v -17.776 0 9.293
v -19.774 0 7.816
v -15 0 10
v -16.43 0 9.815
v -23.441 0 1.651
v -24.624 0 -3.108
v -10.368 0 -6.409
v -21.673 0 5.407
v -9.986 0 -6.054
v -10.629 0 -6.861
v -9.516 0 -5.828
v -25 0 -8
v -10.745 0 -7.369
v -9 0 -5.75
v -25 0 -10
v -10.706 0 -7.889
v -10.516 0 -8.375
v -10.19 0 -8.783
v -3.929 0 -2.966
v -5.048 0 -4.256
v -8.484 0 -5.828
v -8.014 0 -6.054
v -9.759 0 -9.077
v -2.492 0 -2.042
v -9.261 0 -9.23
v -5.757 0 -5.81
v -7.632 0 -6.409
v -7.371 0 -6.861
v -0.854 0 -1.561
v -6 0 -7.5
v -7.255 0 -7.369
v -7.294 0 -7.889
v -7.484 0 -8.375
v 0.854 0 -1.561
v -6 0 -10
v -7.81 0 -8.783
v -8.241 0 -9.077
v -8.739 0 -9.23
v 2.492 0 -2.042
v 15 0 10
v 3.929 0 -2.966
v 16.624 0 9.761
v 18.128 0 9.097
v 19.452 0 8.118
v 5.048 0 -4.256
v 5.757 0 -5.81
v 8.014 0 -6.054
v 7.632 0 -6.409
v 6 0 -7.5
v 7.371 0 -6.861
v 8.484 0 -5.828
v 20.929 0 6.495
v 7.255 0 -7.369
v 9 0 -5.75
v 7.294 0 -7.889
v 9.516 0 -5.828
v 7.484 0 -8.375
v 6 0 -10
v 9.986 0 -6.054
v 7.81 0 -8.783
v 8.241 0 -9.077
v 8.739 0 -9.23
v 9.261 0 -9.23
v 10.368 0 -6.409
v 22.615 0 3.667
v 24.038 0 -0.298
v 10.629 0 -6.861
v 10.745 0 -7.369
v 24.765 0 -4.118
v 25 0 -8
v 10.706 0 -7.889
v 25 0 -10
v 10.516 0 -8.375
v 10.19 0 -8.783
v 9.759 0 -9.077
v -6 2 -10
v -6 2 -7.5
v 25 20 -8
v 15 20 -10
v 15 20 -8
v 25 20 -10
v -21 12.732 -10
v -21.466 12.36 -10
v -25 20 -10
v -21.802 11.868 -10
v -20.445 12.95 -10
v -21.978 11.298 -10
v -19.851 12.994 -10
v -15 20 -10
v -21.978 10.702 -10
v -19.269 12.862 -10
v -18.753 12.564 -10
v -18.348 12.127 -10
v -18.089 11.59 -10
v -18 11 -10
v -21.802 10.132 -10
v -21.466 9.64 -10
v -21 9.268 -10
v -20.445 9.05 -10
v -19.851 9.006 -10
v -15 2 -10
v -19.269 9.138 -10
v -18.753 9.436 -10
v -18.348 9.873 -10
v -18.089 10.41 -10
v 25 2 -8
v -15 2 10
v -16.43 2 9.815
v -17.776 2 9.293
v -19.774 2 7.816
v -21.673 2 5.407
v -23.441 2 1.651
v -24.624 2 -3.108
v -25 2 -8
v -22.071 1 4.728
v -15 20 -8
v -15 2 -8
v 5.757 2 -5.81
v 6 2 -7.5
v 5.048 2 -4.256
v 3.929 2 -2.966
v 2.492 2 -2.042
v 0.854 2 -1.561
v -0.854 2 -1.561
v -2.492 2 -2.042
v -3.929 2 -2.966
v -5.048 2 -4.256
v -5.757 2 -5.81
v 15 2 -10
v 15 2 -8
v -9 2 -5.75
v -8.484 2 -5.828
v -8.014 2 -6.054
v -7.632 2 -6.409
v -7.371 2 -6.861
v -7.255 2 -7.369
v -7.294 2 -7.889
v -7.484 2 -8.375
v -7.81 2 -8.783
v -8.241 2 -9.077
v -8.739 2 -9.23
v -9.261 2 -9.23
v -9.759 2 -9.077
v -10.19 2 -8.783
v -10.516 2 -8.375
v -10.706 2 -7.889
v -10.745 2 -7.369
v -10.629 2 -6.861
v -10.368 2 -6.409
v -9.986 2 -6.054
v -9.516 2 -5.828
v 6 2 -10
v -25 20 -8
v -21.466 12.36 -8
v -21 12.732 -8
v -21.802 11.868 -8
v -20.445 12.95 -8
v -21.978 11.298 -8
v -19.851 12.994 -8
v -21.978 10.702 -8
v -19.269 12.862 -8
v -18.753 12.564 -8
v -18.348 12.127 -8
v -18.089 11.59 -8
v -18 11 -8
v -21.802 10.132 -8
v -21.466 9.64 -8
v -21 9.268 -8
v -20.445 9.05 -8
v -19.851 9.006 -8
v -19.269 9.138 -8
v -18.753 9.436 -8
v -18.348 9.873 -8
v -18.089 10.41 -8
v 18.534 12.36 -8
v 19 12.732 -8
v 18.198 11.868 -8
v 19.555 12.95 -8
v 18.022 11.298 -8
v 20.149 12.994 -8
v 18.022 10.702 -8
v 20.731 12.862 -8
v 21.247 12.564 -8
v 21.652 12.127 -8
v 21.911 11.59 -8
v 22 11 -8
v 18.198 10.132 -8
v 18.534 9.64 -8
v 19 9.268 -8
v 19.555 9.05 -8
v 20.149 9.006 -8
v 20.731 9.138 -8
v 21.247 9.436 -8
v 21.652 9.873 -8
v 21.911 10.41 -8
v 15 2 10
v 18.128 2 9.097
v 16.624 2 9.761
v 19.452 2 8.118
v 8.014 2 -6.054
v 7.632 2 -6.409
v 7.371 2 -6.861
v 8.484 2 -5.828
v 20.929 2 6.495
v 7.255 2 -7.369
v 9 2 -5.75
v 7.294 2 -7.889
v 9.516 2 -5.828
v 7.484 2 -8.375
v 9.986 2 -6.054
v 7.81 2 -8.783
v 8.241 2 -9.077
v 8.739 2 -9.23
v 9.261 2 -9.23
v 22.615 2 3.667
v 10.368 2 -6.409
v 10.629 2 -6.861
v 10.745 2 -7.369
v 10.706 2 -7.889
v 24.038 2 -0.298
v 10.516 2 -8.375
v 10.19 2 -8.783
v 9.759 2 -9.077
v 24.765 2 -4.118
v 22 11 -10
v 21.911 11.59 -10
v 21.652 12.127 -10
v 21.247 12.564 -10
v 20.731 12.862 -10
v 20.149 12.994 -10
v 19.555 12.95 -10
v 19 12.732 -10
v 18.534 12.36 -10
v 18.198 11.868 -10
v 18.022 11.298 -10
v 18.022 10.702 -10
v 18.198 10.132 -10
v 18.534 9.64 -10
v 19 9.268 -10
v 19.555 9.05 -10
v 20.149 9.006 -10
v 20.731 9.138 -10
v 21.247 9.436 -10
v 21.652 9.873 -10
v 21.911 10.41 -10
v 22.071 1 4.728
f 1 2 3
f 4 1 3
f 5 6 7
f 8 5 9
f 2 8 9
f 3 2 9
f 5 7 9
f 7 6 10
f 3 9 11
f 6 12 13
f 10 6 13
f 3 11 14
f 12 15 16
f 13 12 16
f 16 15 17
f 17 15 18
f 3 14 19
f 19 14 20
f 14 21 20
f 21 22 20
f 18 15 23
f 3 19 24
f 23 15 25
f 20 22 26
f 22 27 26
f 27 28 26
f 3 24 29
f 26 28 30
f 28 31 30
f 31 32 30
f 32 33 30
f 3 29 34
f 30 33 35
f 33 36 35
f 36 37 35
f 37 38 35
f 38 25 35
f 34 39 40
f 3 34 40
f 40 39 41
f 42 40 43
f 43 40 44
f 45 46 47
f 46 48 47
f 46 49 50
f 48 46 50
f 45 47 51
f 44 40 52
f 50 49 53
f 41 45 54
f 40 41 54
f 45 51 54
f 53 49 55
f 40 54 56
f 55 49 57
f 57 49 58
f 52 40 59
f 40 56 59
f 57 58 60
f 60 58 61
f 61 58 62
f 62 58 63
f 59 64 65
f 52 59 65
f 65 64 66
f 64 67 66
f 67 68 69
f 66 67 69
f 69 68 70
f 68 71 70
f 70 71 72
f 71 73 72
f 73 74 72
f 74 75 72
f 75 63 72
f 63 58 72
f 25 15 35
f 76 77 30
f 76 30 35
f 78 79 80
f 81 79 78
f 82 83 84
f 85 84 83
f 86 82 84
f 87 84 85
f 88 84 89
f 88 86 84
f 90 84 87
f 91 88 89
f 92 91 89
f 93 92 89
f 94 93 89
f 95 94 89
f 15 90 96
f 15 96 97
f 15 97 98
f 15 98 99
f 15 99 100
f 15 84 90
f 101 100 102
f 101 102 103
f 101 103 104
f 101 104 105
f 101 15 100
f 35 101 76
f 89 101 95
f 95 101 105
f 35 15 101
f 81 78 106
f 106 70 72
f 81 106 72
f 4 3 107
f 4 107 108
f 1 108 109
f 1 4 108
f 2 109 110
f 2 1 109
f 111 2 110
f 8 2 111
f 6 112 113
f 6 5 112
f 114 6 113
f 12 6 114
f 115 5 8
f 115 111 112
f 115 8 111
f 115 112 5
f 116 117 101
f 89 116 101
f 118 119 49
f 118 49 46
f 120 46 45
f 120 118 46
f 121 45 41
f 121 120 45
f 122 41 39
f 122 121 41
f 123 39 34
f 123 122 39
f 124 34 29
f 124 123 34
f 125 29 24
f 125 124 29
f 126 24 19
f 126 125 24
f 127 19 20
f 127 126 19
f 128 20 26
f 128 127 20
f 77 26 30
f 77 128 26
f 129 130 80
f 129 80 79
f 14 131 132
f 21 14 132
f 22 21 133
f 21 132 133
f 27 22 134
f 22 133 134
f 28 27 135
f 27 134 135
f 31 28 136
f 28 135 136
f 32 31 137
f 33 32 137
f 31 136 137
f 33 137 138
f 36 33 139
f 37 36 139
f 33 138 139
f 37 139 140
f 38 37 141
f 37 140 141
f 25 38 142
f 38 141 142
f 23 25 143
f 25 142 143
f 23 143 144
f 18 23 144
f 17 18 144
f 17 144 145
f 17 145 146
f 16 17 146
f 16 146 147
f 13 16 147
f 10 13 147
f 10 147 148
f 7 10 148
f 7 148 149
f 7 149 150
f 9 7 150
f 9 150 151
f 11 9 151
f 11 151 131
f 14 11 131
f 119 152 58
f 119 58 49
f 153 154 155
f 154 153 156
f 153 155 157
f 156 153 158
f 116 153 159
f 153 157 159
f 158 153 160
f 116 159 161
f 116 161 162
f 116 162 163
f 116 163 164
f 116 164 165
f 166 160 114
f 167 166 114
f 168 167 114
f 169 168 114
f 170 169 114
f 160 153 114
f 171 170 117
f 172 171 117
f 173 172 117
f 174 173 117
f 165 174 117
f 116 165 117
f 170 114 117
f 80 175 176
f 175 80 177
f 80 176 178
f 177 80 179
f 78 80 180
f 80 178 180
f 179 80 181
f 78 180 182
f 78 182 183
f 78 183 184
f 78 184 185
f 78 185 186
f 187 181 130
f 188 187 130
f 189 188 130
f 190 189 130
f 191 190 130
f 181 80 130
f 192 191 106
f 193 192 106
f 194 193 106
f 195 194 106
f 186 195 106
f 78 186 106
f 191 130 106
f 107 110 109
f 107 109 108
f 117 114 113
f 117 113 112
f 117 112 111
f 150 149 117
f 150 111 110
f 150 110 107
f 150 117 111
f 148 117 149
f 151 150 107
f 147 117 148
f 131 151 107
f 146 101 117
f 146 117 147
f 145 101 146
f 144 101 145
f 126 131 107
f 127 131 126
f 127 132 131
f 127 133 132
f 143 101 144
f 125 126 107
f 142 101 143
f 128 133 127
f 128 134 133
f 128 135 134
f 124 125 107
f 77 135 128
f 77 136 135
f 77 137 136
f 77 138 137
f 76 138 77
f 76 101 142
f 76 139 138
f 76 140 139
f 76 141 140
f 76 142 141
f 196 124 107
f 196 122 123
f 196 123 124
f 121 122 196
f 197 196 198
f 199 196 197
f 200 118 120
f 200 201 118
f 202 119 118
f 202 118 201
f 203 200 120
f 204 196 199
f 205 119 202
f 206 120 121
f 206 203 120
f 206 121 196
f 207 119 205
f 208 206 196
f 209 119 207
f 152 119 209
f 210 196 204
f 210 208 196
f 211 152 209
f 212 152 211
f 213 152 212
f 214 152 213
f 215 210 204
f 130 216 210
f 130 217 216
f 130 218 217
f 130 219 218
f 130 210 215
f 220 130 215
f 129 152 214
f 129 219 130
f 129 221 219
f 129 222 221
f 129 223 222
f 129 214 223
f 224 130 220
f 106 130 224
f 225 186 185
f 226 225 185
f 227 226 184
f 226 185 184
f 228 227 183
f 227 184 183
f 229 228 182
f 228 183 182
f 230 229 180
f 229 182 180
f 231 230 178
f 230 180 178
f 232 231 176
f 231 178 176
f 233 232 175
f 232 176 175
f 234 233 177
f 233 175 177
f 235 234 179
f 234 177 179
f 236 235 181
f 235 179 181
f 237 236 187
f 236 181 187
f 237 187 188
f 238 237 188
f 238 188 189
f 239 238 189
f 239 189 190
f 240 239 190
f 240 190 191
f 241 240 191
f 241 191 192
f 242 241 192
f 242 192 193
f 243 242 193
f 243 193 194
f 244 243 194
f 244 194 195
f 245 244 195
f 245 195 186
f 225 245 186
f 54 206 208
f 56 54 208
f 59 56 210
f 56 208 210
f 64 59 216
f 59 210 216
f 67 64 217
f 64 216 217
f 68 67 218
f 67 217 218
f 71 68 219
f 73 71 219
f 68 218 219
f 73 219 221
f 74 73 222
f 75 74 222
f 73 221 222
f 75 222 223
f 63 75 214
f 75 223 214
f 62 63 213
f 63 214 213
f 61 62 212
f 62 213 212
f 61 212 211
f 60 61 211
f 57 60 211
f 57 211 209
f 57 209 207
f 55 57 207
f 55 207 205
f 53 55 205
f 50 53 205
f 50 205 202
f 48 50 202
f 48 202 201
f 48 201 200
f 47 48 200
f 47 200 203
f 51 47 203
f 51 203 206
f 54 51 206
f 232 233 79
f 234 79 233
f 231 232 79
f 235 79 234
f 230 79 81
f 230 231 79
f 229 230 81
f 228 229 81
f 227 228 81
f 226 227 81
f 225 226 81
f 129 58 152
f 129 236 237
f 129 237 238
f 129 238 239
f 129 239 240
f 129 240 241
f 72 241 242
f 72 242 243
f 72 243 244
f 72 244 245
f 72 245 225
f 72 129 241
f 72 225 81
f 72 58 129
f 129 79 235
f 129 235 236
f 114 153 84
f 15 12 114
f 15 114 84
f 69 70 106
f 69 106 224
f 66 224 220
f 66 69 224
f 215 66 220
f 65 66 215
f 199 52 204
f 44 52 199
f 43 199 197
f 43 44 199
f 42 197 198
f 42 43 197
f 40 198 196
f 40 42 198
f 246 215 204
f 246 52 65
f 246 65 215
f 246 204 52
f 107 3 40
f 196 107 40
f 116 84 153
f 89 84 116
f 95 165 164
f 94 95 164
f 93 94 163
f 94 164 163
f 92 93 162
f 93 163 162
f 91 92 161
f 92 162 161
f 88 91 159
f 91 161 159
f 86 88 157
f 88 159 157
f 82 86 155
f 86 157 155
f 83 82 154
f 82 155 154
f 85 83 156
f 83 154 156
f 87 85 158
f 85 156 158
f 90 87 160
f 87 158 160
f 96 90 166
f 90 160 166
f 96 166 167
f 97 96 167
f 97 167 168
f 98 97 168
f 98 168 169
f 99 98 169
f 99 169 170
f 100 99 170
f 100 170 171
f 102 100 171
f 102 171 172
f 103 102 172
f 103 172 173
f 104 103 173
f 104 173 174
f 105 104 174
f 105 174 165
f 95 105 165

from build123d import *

# Parameters (mm, degrees)
SKETCH1_W           = 50
SKETCH1_H           = 20
BOSS_EXTRUDE1_DEPTH = 2
SKETCH2_W           = 10
SKETCH2_H           = 2
BOSS_EXTRUDE2_DEPTH = 18
FILLET1_SIZE        = 10
FILLET1_SIZE_2      = 18
FILLET2_SIZE        = 18
FILLET2_SIZE_2      = 10
CUT_EXTRUDE1_DEPTH  = 33.388269589
SKETCH5_R           = 1.75
CUT_EXTRUDE2_DEPTH  = 33.388269589
SKETCH6_R           = 2
CUT_EXTRUDE3_DEPTH  = 37.728735461


with BuildPart() as part:
    # Sketch1 → Boss-Extrude1 (new body)
    with BuildSketch(Plane(origin=(0, 0, 0), x_dir=(1, 0, 0), z_dir=(0, 1, 0))):
        Rectangle(SKETCH1_W, SKETCH1_H)
    extrude(amount=BOSS_EXTRUDE1_DEPTH)

    # Sketch2 → Boss-Extrude2 (add)
    with BuildSketch(Plane(origin=(0, 2, 0), x_dir=(1, 0, 0), z_dir=(0, 1, 0))):
        with Locations((-20, 9)):
            Rectangle(SKETCH2_W, SKETCH2_H)
        with Locations((20, 9)):
            Rectangle(SKETCH2_W, SKETCH2_H)
    extrude(amount=BOSS_EXTRUDE2_DEPTH)

    # Fillet1
    # an asymmetric fillet: 18, 10 mm, written as the material it takes off along each edge
    with BuildSketch(Plane(origin=(-25, -45, 10), x_dir=(1, 0, 0), z_dir=(0, 1, 0))) as fillet1_piece_1:
        with BuildLine():
            Bezier((FILLET1_SIZE, 0), (0, 0), (0, FILLET1_SIZE_2), weights=[1, 0.707106781, 1])
            Line((0, FILLET1_SIZE_2), (0, 0))
            Line((0, 0), (FILLET1_SIZE, 0))
        make_face()
    extrude(amount=92, mode=Mode.SUBTRACT)

    # Fillet2
    # an asymmetric fillet: 18, 10 mm, written as the material it takes off along each edge
    with BuildSketch(Plane(origin=(25, -45, 10), x_dir=(0, 0, -1), z_dir=(0, 1, 0))) as fillet2_piece_1:
        with BuildLine():
            Bezier((FILLET2_SIZE, 0), (0, 0), (0, FILLET2_SIZE_2), weights=[1, 0.707106781, 1])
            Line((0, FILLET2_SIZE_2), (0, 0))
            Line((0, 0), (FILLET2_SIZE, 0))
        make_face()
    extrude(amount=92, mode=Mode.SUBTRACT)

    # Sketch4 → Cut-Extrude1 (cut, through all)
    with BuildSketch(Plane(origin=(0, 2, 0), x_dir=(1, 0, 0), z_dir=(0, 1, 0))):
        with BuildLine():
            Line((-6, 7.5), (-6, 10))
            Line((-6, 10), (6, 10))
            Line((6, 10), (6, 7.5))
            ThreePointArc((6, 7.5), (0, 1.5), (-6, 7.5))
        make_face()
    extrude(amount=-CUT_EXTRUDE1_DEPTH, mode=Mode.SUBTRACT)

    # Sketch5 → Cut-Extrude2 (cut, through all)
    with BuildSketch(Plane(origin=(0, 2, 0), x_dir=(1, 0, 0), z_dir=(0, 1, 0))):
        with Locations(Location((-9, 7.5, 0), (0, 0, 270))):
            Circle(SKETCH5_R)
        with Locations(Location((9, 7.5, 0), (0, 0, 270))):
            Circle(SKETCH5_R)
    extrude(amount=-CUT_EXTRUDE2_DEPTH, mode=Mode.SUBTRACT)

    # Sketch6 → Cut-Extrude3 (cut, through all)
    with BuildSketch(Plane.XY.offset(-8)):
        with Locations((20, 11)):
            Circle(SKETCH6_R)
        with Locations((-20, 11)):
            Circle(SKETCH6_R)
    extrude(amount=-CUT_EXTRUDE3_DEPTH, mode=Mode.SUBTRACT)


solid = part.part
